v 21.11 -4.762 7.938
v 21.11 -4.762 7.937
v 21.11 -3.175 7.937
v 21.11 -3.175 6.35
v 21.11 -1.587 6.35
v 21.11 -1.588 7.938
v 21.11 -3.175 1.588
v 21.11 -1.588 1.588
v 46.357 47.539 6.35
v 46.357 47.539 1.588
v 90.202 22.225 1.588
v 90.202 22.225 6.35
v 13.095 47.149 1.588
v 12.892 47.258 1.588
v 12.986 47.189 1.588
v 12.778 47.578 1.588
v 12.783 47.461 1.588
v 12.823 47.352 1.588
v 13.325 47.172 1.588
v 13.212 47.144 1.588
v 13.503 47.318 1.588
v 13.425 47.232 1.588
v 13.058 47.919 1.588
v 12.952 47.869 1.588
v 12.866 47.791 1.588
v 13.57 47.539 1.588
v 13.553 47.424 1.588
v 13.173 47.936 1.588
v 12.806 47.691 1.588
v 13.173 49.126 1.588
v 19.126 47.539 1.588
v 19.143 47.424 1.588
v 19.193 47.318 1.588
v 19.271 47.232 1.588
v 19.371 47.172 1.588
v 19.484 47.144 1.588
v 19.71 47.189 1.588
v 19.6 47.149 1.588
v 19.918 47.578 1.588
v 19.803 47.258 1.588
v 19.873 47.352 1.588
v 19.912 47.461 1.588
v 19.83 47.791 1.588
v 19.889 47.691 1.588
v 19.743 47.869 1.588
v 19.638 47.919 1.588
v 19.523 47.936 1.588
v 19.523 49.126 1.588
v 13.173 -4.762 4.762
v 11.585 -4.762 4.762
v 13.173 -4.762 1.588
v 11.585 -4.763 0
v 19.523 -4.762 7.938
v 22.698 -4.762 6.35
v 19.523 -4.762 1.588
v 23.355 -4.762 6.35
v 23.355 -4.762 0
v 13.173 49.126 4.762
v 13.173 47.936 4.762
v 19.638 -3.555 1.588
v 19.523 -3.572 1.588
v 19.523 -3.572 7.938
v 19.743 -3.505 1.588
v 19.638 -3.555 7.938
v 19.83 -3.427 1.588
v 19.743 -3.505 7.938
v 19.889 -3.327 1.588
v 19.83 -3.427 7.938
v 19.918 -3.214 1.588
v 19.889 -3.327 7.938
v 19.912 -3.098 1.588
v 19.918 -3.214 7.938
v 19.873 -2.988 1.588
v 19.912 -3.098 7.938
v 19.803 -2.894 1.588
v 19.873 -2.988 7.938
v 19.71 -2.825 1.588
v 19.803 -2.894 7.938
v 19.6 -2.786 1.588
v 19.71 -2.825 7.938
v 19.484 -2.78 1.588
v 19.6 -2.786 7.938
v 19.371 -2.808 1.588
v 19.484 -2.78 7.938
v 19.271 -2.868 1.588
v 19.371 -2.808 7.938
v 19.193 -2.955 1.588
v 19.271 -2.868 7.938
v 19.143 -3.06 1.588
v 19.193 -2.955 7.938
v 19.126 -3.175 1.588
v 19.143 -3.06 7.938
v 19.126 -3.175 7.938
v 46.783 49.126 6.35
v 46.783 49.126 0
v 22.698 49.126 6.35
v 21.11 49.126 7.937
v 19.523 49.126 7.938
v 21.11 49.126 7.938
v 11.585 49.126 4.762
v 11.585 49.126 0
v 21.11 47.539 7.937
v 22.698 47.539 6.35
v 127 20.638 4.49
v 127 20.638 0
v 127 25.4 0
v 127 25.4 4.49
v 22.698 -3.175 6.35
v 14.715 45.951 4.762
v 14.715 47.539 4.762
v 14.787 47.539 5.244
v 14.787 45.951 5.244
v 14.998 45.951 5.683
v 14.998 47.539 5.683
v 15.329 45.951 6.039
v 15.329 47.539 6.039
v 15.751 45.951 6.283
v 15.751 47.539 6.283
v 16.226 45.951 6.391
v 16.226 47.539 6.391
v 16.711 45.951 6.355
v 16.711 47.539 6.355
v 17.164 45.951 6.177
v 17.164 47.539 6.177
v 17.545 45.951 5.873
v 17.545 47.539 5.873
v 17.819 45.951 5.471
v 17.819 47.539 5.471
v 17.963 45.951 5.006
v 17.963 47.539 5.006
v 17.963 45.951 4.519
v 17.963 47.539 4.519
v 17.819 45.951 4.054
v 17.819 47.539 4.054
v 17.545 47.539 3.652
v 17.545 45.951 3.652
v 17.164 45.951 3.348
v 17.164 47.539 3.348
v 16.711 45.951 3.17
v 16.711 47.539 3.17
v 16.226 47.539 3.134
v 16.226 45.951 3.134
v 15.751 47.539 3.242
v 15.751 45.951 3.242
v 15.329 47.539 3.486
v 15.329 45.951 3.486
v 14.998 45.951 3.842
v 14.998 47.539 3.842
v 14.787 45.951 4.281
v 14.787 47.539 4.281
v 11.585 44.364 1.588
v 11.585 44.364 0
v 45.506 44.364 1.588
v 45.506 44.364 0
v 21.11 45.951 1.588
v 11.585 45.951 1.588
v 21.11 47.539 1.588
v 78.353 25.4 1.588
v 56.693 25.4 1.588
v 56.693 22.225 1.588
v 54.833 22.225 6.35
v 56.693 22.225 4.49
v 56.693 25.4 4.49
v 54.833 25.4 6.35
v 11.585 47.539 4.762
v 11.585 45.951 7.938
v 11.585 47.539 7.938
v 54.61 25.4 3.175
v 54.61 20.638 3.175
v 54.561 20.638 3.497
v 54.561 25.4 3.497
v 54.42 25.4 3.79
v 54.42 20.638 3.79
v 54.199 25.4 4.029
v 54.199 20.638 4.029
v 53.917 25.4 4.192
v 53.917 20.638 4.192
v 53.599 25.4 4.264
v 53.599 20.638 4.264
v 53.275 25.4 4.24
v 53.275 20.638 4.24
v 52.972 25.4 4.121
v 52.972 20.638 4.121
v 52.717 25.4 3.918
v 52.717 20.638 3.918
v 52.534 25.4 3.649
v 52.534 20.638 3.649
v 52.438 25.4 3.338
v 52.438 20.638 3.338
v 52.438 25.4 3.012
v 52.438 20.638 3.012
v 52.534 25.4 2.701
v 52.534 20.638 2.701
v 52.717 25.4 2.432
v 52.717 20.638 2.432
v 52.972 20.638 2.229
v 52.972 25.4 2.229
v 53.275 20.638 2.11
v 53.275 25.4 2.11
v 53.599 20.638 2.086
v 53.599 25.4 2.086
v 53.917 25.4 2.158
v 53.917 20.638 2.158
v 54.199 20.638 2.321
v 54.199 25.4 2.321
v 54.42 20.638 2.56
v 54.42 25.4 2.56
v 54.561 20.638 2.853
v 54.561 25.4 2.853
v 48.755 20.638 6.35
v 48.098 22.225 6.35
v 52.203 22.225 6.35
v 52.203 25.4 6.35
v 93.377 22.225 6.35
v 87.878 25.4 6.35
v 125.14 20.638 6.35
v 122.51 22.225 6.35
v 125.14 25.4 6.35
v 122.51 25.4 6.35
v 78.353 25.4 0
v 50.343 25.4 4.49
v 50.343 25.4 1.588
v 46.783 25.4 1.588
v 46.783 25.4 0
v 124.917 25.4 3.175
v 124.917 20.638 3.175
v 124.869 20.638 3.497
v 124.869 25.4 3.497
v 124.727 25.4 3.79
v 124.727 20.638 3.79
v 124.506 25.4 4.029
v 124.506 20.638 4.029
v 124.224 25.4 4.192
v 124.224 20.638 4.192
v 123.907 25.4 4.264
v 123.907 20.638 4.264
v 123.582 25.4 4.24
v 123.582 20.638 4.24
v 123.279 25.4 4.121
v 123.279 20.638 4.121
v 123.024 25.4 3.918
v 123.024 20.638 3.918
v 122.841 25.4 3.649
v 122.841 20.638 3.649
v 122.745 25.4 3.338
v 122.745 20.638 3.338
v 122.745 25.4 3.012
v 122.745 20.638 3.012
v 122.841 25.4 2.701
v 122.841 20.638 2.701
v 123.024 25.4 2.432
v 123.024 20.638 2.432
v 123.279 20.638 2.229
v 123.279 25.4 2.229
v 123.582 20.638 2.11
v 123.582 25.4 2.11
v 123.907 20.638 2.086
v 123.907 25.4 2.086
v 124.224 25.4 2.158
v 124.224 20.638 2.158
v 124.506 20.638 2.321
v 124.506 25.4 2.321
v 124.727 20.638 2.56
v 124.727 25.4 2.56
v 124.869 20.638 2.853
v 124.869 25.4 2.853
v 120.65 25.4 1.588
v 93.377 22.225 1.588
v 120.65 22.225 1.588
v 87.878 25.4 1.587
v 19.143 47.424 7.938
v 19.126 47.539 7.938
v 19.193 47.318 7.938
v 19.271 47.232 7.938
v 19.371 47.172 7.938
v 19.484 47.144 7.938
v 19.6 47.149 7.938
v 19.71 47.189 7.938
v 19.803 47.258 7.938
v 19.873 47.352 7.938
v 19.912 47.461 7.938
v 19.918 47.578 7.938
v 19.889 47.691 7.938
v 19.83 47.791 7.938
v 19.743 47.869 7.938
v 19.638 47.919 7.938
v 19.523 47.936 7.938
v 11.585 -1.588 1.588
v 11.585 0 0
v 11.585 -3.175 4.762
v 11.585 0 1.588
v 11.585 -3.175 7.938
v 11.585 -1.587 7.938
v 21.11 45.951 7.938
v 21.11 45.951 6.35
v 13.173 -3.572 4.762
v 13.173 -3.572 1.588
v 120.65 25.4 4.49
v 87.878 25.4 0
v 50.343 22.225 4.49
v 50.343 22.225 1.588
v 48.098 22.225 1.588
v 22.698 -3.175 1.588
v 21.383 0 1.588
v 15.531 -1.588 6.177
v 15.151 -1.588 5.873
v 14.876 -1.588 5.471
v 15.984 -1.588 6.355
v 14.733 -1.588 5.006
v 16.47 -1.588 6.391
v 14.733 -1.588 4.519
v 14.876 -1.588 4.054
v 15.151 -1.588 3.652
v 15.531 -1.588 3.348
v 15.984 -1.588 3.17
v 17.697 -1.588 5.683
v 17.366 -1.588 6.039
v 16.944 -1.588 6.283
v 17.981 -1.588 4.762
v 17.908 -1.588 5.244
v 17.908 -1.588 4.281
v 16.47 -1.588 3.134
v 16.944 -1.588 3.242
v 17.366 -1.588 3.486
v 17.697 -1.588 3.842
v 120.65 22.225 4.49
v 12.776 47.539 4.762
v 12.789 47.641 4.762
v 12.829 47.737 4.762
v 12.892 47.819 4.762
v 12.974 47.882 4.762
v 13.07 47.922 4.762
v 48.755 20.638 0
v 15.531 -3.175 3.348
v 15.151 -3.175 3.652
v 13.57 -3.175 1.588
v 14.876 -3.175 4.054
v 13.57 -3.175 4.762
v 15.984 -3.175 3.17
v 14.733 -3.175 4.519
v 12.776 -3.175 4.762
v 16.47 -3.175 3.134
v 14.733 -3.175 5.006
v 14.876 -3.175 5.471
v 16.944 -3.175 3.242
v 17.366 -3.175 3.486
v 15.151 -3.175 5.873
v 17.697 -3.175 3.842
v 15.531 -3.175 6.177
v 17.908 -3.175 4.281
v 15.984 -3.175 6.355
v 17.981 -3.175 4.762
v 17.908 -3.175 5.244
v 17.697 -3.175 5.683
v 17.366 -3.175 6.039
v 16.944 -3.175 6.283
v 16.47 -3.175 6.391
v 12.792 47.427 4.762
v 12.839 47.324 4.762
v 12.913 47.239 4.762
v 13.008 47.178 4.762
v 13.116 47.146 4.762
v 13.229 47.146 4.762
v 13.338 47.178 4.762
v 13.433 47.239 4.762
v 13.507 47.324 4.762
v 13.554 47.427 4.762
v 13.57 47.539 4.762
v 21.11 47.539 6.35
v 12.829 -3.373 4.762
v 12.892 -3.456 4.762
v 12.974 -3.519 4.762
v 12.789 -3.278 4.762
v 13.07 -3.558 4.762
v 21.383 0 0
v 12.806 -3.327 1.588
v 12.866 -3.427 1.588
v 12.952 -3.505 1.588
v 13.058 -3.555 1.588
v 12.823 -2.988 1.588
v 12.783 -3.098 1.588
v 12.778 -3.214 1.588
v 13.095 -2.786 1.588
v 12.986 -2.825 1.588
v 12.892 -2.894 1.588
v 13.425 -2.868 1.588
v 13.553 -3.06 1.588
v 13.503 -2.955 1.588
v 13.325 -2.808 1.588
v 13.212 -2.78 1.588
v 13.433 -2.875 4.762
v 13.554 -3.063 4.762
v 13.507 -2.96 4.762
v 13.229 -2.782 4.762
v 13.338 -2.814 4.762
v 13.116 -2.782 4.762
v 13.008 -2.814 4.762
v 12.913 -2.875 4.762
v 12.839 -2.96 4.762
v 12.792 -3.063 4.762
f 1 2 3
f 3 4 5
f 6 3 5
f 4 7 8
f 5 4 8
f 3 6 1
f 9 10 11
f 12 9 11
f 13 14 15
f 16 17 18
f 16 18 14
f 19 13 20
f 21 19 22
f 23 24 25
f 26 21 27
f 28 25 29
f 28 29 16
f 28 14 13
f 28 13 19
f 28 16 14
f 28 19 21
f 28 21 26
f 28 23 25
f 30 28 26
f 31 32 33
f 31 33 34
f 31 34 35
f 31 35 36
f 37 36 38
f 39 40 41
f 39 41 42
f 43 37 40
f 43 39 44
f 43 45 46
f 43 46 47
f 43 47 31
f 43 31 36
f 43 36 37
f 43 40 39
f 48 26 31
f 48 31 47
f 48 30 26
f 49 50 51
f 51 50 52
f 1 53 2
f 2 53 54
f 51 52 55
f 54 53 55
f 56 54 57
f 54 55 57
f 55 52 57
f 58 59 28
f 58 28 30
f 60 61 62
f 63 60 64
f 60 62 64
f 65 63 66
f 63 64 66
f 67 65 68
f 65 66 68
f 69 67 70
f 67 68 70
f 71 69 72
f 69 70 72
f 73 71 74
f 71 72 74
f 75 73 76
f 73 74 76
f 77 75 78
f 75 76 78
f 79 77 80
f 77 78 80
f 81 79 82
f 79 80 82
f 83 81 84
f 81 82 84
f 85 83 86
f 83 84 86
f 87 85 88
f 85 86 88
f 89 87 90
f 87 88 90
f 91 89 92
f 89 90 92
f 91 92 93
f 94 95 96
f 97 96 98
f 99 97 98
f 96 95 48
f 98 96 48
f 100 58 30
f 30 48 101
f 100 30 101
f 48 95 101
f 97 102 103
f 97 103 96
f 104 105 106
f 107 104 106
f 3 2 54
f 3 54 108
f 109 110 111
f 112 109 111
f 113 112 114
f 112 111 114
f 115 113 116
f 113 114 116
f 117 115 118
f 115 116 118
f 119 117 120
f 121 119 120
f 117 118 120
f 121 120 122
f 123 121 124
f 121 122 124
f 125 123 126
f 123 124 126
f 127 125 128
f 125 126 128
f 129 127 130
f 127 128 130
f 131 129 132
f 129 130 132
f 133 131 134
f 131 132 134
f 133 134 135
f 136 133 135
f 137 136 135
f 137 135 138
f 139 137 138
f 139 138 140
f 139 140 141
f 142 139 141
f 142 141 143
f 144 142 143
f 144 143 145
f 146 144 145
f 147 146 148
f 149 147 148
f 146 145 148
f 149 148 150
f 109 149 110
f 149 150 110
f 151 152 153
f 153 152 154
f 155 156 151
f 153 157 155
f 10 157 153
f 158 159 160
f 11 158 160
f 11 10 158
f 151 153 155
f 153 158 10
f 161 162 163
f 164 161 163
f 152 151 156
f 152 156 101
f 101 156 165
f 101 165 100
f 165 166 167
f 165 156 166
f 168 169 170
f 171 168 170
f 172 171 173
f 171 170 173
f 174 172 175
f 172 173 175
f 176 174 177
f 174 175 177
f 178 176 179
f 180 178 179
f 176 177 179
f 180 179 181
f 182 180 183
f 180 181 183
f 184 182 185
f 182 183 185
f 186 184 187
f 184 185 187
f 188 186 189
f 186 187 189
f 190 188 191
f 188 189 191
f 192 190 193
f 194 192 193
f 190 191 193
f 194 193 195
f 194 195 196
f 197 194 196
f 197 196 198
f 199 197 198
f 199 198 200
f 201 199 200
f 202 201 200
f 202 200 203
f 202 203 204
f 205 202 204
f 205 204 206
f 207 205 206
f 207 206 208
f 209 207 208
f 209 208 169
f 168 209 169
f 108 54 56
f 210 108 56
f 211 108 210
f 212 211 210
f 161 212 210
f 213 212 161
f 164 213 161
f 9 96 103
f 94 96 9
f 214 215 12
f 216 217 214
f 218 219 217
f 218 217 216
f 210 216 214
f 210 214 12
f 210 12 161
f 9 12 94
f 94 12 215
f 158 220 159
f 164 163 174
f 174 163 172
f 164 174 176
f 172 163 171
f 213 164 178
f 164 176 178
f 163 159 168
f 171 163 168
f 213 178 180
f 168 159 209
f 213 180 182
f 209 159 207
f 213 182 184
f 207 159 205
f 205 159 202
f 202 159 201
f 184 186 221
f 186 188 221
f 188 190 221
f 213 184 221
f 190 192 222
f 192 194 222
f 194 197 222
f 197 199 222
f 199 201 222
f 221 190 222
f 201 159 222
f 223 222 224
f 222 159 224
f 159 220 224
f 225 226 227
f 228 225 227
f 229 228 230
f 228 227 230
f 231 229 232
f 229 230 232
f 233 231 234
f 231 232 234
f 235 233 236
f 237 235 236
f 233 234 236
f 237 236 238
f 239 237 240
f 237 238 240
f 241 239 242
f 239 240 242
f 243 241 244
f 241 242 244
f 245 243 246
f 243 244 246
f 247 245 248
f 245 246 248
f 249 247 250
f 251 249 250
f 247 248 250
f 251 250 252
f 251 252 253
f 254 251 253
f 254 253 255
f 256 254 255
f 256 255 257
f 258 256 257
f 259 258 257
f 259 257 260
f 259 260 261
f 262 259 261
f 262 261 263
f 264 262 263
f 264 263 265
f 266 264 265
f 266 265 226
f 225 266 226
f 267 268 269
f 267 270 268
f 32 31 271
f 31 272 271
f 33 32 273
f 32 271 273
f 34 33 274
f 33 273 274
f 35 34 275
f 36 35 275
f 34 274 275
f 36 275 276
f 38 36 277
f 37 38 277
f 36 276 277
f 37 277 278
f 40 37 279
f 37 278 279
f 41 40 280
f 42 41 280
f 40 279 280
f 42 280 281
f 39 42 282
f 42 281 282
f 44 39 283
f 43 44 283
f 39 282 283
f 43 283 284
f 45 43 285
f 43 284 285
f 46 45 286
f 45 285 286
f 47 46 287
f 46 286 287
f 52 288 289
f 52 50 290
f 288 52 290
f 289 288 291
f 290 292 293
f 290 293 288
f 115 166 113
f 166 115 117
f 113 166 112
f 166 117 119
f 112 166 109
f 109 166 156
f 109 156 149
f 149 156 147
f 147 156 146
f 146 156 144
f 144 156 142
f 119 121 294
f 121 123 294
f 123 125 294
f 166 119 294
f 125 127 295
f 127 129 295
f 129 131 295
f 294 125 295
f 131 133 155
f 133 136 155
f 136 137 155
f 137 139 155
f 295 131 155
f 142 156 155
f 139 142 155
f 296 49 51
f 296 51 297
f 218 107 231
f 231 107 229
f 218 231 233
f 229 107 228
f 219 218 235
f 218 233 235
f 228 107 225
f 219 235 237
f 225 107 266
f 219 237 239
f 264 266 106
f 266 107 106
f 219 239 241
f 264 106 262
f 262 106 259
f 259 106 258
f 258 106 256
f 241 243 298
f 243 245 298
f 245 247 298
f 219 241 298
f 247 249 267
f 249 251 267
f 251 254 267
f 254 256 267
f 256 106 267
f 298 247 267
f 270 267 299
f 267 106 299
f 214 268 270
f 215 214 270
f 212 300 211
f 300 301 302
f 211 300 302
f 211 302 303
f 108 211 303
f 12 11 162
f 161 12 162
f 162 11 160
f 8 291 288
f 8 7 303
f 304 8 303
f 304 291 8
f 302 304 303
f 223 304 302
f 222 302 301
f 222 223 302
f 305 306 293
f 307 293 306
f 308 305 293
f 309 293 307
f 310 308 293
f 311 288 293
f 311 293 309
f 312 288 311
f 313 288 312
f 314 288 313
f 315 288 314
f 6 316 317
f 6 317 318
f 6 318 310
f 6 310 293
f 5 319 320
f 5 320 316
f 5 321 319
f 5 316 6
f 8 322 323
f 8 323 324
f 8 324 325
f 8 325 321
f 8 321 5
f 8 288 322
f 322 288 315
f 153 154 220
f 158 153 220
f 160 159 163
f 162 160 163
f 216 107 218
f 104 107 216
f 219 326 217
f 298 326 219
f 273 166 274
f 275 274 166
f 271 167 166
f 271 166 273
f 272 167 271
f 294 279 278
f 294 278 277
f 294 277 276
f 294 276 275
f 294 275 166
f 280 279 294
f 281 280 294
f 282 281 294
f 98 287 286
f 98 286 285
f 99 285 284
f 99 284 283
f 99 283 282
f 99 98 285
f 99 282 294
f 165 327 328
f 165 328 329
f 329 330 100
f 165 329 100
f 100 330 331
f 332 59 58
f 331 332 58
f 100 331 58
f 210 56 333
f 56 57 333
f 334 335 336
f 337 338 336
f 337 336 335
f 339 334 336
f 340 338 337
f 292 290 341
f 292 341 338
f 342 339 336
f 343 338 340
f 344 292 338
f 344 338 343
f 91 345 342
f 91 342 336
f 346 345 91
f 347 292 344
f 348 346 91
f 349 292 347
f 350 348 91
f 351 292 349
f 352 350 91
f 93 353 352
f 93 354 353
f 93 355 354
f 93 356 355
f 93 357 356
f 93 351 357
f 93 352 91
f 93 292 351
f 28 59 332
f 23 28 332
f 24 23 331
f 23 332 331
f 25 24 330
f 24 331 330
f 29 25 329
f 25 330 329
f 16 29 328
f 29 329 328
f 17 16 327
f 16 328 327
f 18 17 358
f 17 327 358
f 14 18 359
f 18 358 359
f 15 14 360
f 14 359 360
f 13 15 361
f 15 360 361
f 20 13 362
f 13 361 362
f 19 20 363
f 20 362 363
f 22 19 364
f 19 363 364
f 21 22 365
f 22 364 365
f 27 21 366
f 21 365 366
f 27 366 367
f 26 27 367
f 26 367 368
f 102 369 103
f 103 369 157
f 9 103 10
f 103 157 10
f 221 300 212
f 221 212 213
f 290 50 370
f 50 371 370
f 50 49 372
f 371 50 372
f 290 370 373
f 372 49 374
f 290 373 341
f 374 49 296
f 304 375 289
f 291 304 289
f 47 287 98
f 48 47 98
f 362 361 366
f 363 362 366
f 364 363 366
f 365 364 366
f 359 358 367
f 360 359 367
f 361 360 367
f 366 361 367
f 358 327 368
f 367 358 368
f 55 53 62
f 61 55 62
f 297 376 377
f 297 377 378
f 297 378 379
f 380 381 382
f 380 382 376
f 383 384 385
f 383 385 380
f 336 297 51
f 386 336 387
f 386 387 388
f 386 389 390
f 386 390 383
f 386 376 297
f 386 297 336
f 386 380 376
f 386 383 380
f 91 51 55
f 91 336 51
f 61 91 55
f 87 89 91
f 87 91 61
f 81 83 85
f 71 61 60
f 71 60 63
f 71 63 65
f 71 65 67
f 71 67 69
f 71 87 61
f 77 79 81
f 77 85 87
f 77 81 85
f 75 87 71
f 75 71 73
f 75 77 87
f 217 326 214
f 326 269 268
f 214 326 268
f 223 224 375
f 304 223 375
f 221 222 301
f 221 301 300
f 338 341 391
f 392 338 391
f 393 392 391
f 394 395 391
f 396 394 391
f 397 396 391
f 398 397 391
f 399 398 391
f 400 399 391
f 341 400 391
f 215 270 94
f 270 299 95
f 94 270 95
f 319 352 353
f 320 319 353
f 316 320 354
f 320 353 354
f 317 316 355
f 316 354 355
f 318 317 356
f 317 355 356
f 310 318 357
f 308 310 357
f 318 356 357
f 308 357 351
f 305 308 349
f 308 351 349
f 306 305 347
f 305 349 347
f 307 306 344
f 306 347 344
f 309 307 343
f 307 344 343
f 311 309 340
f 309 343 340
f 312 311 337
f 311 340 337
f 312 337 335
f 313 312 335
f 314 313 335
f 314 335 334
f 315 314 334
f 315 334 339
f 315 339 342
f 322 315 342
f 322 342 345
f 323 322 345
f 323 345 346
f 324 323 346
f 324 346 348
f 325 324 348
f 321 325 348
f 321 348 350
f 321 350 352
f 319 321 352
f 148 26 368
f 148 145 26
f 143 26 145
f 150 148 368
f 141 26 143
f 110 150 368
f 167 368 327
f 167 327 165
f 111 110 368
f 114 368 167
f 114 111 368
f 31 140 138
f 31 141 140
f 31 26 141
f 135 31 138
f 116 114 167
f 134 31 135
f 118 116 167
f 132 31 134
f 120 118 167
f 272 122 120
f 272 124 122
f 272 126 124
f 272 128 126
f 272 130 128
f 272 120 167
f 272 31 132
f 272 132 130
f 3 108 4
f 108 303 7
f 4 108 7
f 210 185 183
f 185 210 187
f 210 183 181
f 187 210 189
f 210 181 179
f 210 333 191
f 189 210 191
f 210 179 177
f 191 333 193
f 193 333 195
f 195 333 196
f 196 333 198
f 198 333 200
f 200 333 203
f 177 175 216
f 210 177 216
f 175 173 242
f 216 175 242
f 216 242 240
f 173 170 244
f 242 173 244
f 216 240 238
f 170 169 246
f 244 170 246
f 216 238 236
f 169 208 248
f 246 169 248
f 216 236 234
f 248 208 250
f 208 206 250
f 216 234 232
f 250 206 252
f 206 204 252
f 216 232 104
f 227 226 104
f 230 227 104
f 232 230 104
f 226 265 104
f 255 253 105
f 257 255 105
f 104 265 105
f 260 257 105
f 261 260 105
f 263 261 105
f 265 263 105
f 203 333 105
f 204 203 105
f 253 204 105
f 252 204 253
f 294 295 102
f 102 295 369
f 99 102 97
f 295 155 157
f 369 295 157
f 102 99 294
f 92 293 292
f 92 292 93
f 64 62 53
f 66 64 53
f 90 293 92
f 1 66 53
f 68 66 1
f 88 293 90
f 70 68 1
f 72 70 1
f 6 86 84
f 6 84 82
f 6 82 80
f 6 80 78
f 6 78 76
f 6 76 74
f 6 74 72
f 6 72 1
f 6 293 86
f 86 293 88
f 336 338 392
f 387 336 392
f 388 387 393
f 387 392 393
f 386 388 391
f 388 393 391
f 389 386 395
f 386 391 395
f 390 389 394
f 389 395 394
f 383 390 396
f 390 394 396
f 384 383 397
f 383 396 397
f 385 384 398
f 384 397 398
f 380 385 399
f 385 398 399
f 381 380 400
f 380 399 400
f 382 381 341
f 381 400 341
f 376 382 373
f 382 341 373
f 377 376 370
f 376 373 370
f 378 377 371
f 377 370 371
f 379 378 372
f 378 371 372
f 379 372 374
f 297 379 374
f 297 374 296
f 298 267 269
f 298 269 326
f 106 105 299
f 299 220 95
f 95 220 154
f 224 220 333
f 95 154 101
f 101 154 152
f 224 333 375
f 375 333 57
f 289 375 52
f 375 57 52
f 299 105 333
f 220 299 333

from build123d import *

# Parameters (mm, degrees)
F1_DEPTH  = 1.5875
F3_DEPTH  = 4.7625
F4_W      = 6.35
F4_H      = 6.35
F5_DEPTH  = 3.175
F6_SIZE   = 1.8598642
F7_W      = 42.2204719395
F7_H      = 3.175
F8_DEPTH  = 1.5875
F9_W      = 6.35
F9_H      = 1.5875
F10_DEPTH = 6.35
F11_R     = 1.0922
F11_R_2   = 1.63322
F12_DEPTH = 28.575
F13_SIZE  = 1.58749
F14_R     = 0.396875
F15_DEPTH = 6.35
F16_R     = 1.63322
F17_DEPTH = 1.5875
F18_W     = 138.5852359697
F18_H     = 53.8887336135
F19_DEPTH = 7.9375
F20_W     = 1.5875
F20_H     = 3.175
F21_DEPTH = 1.5875
F22_R     = 0.396875
F23_DEPTH = 3.175


# Not quite as in the source:
# - a fillet or chamfer is up to 0.001 mm smaller than in the source, because OpenCascade refuses the exact size


with BuildPart() as f1:
    # F0 (on Top) → F1 (new body)
    with BuildSketch(Plane.XY):
        Polygon((-87.87765, 25.4), (-127, 25.4), (-127, 20.6375), (-48.7553, 20.6375), (-23.3553, -4.7625), (23.3553, -4.7625), (48.7553, 20.6375), (127, 20.6375), (127, 25.4), (87.87765, 25.4), (46.7826079092, 49.1262336135), (-46.7826079092, 49.1262336135), align=None)
        Polygon((-21.3826079092, 0), (-46.7826079092, 25.4), (-78.35265, 25.4), (-45.5064998802, 44.3637336135), (45.5064998802, 44.3637336135), (78.35265, 25.4), (46.7826079092, 25.4), (21.3826079092, 0), align=None, mode=Mode.SUBTRACT)
    extrude(amount=F1_DEPTH)

    # F2 (on face) → F3 (join)
    with BuildSketch(Plane.XY.offset(1.5875)):
        Polygon((-127, 22.225), (-127, 20.6375), (-48.7553, 20.6375), (-23.3553, -4.7625), (23.3553, -4.7625), (48.7553, 20.6375), (127, 20.6375), (127, 22.225), (93.376911314, 22.225), (87.87765, 25.4), (46.7826079092, 49.1262336135), (-46.7826079092, 49.1262336135), (-87.87765, 25.4), (-93.376911314, 22.225), align=None)
        Polygon((90.201911314, 22.225), (48.0977359697, 22.225), (22.6977359697, -3.175), (21.1102359697, -3.175), (21.1102359697, -1.5875), (-21.1102359697, -1.5875), (-21.1102359697, -3.175), (-22.6977359697, -3.175), (-48.0977359697, 22.225), (-90.201911314, 22.225), (-46.3572385662, 47.5387336135), (-21.1102359697, 47.5387336135), (-21.1102359697, 45.9512336135), (21.1102359697, 45.9512336135), (21.1102359697, 47.5387336135), (46.3572385662, 47.5387336135), align=None, mode=Mode.SUBTRACT)
    extrude(amount=F3_DEPTH)

    # F4 (on face) → F5 (join, through all)
    with BuildSketch(Plane(origin=(0, 22.225, 0), x_dir=(-1, 0, 0), z_dir=(0, 1, 0))):
        with Locations((-53.5178, 3.175)):
            Rectangle(F4_W, F4_H)
        with Locations((-123.825, 3.175)):
            Rectangle(F4_W, F4_H)
        with Locations((123.825, 3.175)):
            Rectangle(F4_W, F4_H)
        with Locations((53.5178, 3.175)):
            Rectangle(F4_W, F4_H)
    extrude(amount=F5_DEPTH)

    # F6
    f6_edges = [f1.edges().sort_by_distance(p)[0] for p in [
        (-127, 23.01875, 6.35),
        (-120.65, 23.8125, 6.35),
        (-56.6928, 23.8125, 6.35),
        (-50.3428, 23.8125, 6.35),
        (50.3428, 23.8125, 6.35),
        (56.6928, 23.8125, 6.35),
        (120.65, 23.8125, 6.35),
        (127, 23.01875, 6.35),
    ]]
    chamfer(f6_edges, length=F6_SIZE)

    # F7 (on face) → F8 (join)
    with BuildSketch(Plane.XY.offset(6.35)):
        with Locations((0, -3.175)):
            Rectangle(F7_W, F7_H)
        with Locations((0, 47.5387336135)):
            Rectangle(F7_W, F7_H)
    extrude(amount=F8_DEPTH)

    # F9 (on face) → F10 (cut, through all)
    with BuildSketch(Plane.XY.offset(7.9375)):
        with Locations((16.3477359697, -3.96875)):
            Rectangle(F9_W, F9_H)
        with Locations((16.3477359697, 48.3324836135)):
            Rectangle(F9_W, F9_H)
    extrude(amount=-F10_DEPTH, mode=Mode.SUBTRACT)

    # F11 (on face) → F12 (cut, through all)
    with BuildSketch(Plane.XZ.offset(3.175)):
        with Locations((53.5178, 3.175)):
            Circle(F11_R)
        with Locations((123.825, 3.175)):
            Circle(F11_R)
        with Locations((-123.825, 3.175)):
            Circle(F11_R)
        with Locations((-53.5178, 3.175)):
            Circle(F11_R)
        with Locations((16.3477359697, 4.7625)):
            Circle(F11_R_2)
    extrude(amount=-F12_DEPTH, mode=Mode.SUBTRACT)

    # F13 (size 1.5875 in the source; OpenCascade refuses exactly that, so slightly less here)
    f13_edges = [f1.edges().sort_by_distance(p)[0] for p in [
        (-21.110236, -3.96875, 6.35),
        (21.110236, -3.96875, 6.35),
        (-21.110236, 48.332484, 6.35),
        (21.110236, 48.332484, 6.35),
    ]]
    chamfer(f13_edges, length=F13_SIZE)

    # F14 (on face) → F15 (cut, through all)
    with BuildSketch(Plane.XY.offset(7.9375)):
        with Locations((19.5227359697, -3.175)):
            Circle(F14_R)
        with Locations((19.5227359697, 47.5387336135)):
            Circle(F14_R)
    extrude(amount=-F15_DEPTH, mode=Mode.SUBTRACT)

    # F16 (on face) → F17 (cut, through all)
    with BuildSketch(Plane(origin=(0, 47.5387336135, 0), x_dir=(-1, 0, 0), z_dir=(0, 1, 0))):
        with Locations((-16.3477359697, 4.7625)):
            Circle(F16_R)
    extrude(amount=-F17_DEPTH, mode=Mode.SUBTRACT)

    # F18 (on face) → F19 (cut, through all)
    with BuildSketch(Plane.XY.offset(7.9375)):
        with Locations((-57.7073820151, 22.1818668067)):
            Rectangle(F18_W, F18_H)
    extrude(amount=-F19_DEPTH, mode=Mode.SUBTRACT)

    # F20 (on face) → F21 (cut, through all)
    with BuildSketch(Plane.YZ.offset(13.1727359697)):
        with Locations((48.3324836135, 6.35)):
            Rectangle(F20_W, F20_H)
        with Locations((-3.96875, 6.35)):
            Rectangle(F20_W, F20_H)
    extrude(amount=-F21_DEPTH, mode=Mode.SUBTRACT)

    # F22 (on face) → F23 (cut, through all)
    with BuildSketch(Plane.XY.offset(4.7625)):
        with Locations((13.1727359697, -3.175)):
            Circle(F22_R)
        with Locations((13.1727359697, 47.5387336135)):
            Circle(F22_R)
    extrude(amount=-F23_DEPTH, mode=Mode.SUBTRACT)


solid = f1.part
